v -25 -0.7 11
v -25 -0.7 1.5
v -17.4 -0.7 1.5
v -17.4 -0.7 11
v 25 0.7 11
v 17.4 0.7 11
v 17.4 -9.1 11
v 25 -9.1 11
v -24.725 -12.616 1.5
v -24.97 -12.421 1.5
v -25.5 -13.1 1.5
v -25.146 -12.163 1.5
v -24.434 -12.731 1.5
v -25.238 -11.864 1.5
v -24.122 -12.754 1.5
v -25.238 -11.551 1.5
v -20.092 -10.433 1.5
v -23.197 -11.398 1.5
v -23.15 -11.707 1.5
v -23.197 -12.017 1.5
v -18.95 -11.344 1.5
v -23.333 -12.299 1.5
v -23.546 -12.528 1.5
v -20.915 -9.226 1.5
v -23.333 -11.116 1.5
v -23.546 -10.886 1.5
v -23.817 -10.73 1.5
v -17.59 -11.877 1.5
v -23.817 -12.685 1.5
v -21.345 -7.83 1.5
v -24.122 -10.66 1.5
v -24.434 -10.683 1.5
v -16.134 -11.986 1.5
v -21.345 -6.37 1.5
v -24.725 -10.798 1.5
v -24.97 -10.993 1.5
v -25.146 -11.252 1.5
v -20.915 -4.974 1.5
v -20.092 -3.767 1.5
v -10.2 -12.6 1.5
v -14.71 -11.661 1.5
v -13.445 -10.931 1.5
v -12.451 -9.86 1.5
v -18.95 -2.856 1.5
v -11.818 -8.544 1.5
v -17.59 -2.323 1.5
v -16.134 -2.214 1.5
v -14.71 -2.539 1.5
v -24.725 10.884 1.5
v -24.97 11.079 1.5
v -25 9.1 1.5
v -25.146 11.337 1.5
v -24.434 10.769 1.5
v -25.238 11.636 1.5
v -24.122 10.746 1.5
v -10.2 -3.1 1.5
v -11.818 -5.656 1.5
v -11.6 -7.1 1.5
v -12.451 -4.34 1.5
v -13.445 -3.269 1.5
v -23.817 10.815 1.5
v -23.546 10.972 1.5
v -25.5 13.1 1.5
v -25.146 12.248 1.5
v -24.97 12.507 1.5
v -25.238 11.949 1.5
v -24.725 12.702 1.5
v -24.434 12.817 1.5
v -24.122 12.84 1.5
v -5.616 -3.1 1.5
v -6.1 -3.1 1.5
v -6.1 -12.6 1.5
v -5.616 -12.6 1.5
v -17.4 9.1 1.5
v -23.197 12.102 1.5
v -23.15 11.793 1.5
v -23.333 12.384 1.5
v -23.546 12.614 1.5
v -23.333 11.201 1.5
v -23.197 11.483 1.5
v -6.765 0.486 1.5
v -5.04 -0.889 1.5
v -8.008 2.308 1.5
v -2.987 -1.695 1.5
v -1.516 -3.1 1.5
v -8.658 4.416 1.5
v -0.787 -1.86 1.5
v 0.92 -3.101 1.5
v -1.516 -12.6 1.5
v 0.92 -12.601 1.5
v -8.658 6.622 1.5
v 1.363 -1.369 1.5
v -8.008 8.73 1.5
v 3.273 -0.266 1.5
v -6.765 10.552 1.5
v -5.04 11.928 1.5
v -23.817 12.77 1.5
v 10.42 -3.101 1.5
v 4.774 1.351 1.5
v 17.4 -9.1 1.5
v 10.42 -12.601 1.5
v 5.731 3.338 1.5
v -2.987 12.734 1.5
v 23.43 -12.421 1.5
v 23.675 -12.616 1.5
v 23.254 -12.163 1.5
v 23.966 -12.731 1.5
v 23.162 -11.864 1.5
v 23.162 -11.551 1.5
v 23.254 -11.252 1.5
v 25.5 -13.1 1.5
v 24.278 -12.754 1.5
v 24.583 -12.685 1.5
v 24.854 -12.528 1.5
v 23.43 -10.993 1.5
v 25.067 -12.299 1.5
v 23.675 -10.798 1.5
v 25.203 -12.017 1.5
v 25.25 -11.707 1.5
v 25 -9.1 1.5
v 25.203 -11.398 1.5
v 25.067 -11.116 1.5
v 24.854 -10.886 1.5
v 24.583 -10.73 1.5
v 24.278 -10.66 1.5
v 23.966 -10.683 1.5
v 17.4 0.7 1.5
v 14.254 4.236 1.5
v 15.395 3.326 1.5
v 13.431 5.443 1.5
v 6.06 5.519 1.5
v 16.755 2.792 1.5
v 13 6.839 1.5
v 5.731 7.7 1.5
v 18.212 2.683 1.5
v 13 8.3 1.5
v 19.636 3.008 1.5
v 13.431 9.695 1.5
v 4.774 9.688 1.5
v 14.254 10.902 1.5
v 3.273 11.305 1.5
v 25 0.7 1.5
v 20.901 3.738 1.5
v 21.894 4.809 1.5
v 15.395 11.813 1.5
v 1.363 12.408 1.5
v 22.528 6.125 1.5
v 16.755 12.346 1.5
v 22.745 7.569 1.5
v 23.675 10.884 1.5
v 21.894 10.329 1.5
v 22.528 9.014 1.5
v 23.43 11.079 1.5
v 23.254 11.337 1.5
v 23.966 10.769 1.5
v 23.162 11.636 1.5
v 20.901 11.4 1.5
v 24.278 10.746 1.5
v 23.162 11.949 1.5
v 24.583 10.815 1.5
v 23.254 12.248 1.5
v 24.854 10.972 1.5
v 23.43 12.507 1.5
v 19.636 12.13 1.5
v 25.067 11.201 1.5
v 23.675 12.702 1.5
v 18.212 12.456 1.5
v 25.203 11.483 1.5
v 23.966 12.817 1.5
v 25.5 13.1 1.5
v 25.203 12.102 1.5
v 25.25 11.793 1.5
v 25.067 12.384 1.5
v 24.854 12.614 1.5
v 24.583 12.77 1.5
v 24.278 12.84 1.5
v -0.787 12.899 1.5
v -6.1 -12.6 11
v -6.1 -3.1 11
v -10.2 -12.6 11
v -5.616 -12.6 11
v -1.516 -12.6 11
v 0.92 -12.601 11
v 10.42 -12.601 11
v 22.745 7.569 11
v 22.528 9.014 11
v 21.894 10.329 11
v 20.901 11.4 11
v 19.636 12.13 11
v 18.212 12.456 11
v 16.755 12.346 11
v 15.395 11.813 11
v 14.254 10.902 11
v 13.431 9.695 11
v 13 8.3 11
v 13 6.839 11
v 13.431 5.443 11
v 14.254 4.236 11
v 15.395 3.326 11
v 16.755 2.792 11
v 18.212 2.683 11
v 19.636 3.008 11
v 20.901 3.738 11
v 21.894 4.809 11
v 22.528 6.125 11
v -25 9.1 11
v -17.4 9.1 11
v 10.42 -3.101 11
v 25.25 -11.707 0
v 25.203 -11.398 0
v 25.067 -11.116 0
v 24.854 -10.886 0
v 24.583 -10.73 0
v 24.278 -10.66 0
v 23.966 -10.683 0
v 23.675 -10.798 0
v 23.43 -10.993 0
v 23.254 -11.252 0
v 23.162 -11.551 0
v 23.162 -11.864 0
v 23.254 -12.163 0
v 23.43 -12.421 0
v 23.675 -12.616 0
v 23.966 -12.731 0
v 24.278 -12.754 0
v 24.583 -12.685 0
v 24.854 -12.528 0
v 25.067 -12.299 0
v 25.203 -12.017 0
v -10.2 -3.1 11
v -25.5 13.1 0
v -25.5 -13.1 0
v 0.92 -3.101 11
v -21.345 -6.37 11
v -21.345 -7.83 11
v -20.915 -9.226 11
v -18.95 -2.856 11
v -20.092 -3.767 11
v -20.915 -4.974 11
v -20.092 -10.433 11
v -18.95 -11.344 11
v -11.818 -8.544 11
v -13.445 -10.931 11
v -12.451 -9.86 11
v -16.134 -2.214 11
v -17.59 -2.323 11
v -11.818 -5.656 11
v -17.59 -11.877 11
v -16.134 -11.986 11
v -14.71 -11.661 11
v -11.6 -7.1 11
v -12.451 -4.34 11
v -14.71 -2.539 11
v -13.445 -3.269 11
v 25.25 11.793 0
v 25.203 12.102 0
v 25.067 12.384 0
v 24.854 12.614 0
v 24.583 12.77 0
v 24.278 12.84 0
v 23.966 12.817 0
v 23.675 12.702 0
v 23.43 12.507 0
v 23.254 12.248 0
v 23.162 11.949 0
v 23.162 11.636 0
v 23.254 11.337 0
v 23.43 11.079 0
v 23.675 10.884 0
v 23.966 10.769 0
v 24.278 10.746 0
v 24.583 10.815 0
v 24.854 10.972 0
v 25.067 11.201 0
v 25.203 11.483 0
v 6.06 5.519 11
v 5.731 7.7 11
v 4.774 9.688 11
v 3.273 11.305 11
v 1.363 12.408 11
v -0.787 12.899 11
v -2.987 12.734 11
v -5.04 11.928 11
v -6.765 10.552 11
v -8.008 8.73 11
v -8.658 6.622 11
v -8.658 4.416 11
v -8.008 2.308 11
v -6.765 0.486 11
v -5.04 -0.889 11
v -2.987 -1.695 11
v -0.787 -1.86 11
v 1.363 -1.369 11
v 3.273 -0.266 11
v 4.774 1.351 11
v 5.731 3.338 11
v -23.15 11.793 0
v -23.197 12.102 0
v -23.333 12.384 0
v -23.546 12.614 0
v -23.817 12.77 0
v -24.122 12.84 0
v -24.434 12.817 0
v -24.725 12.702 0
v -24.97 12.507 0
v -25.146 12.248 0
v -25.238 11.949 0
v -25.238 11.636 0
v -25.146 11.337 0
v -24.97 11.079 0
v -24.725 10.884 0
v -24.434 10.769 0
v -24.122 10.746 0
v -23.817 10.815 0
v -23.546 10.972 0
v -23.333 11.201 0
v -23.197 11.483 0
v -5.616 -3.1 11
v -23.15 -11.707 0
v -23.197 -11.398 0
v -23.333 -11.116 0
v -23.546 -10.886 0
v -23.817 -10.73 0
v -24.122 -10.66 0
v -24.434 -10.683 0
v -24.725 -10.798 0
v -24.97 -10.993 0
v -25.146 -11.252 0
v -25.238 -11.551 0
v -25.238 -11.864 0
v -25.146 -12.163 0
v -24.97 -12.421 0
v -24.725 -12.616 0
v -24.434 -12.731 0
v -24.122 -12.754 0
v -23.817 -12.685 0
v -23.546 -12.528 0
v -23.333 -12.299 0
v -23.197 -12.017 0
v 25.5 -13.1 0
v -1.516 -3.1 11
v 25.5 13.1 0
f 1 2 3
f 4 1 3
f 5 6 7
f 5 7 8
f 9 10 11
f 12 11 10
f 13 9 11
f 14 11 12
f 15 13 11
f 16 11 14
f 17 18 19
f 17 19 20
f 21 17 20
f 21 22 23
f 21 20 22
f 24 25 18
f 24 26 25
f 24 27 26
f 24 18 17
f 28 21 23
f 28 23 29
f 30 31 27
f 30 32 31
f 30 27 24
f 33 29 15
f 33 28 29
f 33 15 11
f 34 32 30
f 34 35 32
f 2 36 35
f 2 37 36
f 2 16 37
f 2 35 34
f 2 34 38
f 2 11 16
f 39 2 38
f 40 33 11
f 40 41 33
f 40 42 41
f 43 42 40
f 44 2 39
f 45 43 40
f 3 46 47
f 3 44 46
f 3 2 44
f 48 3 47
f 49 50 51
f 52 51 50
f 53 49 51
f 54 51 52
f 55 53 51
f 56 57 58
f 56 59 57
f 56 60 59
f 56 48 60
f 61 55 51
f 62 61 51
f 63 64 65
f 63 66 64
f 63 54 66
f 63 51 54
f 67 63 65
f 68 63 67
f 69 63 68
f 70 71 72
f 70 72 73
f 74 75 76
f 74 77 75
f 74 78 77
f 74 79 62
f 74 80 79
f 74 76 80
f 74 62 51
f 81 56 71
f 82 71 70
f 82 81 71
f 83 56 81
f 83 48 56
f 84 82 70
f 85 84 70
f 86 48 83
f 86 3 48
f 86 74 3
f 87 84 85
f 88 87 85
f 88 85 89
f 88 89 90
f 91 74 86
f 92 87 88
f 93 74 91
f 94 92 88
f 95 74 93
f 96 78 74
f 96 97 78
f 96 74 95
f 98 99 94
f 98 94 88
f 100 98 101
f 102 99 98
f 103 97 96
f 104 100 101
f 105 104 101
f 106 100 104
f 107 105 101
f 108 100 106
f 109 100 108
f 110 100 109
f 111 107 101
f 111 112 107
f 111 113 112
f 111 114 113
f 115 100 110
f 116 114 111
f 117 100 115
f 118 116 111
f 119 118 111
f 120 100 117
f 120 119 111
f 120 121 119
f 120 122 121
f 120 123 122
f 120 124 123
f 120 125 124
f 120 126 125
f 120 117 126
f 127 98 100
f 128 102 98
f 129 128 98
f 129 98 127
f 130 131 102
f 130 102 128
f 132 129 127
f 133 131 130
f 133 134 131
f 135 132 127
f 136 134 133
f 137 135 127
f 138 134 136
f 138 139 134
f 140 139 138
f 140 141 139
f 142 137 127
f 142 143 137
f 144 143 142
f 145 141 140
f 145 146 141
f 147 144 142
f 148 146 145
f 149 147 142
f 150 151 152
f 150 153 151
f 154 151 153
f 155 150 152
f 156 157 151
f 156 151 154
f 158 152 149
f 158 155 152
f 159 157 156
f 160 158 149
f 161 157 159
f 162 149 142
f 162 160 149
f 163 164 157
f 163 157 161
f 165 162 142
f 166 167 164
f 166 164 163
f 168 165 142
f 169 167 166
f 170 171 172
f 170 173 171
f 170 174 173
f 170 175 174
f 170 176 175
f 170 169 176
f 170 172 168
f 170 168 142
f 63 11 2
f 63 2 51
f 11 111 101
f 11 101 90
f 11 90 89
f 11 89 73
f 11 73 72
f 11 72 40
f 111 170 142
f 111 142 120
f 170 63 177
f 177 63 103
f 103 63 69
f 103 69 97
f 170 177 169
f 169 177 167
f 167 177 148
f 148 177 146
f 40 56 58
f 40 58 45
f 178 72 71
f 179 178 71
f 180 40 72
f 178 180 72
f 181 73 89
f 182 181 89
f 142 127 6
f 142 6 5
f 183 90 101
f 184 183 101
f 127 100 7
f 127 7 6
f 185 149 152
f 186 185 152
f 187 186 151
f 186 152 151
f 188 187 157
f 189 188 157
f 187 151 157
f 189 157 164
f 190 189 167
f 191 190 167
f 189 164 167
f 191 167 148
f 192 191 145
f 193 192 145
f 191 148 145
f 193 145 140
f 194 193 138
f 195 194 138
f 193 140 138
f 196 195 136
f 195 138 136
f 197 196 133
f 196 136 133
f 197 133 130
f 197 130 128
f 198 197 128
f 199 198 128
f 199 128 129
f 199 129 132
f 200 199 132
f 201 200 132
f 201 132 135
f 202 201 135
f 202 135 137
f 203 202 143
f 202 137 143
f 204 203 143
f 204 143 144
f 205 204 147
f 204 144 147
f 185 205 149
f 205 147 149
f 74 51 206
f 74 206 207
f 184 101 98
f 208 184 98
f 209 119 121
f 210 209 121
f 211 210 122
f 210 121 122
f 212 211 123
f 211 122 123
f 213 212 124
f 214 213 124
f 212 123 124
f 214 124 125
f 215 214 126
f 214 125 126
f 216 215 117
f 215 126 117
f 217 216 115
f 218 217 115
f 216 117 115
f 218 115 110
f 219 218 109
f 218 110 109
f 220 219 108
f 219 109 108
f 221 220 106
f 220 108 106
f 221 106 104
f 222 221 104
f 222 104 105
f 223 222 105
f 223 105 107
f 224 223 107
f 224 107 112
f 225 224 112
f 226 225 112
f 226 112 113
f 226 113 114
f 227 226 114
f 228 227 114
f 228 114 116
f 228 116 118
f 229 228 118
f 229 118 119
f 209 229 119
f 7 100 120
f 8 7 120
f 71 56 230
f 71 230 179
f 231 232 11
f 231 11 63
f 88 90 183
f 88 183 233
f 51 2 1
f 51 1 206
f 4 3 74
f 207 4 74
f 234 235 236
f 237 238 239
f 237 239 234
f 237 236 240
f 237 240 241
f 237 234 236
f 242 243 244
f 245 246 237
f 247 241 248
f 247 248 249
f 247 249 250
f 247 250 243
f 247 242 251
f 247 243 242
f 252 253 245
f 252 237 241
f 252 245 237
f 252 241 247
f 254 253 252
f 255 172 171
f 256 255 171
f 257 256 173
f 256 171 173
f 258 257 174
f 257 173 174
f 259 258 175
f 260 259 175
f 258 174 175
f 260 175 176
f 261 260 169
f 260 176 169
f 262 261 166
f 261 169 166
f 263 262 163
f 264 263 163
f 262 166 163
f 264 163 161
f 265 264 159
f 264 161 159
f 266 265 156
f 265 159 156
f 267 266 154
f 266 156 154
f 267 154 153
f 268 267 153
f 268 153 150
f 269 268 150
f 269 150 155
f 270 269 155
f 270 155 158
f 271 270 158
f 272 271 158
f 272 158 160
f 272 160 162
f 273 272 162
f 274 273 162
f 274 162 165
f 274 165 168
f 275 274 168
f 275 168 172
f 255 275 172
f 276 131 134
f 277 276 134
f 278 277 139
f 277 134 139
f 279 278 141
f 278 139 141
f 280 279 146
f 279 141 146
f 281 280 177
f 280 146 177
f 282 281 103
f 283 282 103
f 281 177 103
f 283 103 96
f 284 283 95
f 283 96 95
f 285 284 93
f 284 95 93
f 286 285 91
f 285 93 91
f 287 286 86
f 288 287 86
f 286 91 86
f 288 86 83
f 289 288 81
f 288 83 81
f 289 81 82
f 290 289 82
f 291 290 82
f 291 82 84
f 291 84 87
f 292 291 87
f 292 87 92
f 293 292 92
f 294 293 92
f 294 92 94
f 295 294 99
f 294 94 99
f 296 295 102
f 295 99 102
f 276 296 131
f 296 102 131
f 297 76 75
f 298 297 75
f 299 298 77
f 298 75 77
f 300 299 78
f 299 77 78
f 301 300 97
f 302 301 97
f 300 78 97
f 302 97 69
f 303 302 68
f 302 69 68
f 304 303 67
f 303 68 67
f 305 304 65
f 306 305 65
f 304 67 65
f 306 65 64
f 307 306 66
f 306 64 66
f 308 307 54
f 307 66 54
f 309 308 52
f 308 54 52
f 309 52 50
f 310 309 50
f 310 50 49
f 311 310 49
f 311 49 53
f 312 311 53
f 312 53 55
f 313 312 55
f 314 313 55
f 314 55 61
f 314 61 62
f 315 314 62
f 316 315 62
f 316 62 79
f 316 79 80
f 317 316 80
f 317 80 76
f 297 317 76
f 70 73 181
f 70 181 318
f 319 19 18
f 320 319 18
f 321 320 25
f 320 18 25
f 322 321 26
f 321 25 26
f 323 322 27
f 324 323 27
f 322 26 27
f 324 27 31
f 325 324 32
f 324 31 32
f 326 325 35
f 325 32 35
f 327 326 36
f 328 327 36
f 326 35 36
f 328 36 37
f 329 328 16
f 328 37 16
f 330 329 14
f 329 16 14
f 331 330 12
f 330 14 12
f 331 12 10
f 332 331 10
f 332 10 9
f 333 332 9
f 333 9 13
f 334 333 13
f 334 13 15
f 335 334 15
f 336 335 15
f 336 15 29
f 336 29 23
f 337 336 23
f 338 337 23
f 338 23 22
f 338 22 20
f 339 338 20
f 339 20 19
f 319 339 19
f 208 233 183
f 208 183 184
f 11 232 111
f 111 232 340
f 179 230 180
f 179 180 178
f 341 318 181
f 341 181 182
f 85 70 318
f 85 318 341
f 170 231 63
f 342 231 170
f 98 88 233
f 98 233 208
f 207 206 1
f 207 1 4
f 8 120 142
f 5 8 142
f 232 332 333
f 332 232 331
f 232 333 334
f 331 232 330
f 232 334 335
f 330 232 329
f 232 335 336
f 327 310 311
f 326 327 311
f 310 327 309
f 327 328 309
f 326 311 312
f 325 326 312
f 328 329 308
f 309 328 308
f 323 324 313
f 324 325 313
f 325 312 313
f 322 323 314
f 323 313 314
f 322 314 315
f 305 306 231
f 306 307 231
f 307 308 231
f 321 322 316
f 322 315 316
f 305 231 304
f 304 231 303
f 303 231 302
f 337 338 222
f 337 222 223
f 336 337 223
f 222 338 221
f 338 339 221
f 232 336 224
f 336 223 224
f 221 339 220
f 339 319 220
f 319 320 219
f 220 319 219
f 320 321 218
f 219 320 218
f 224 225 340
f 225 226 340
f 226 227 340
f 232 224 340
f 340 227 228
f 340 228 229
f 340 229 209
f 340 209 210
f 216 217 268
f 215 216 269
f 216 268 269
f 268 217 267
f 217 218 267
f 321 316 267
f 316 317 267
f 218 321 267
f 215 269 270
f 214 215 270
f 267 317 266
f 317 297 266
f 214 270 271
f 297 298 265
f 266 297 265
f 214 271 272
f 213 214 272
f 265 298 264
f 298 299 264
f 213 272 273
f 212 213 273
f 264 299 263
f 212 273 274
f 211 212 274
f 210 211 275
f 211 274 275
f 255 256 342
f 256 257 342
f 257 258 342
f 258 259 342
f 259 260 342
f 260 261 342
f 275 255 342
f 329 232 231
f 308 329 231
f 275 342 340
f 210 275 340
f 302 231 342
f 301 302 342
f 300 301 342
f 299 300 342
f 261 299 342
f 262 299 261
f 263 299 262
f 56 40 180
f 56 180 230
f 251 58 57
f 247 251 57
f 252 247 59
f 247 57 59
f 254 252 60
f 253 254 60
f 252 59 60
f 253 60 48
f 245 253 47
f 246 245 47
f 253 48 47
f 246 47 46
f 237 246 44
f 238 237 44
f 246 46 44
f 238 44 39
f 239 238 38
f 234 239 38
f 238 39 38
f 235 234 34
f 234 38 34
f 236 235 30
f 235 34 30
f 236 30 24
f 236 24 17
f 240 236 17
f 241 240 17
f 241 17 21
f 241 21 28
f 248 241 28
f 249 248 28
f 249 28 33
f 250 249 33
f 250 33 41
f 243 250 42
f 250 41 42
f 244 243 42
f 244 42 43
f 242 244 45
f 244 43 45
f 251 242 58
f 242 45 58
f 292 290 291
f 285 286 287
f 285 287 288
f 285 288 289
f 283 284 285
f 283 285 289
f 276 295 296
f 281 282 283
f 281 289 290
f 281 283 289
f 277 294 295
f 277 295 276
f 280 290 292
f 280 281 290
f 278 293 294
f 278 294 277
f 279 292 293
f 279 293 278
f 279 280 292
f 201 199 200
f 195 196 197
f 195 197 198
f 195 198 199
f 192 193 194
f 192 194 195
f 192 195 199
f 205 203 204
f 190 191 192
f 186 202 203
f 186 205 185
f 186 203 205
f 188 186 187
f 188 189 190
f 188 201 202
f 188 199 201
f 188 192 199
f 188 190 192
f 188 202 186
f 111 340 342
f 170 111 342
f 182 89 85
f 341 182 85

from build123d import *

# Parameters (mm, degrees)
SKETCH_1_W          = 51
SKETCH_1_H          = 26.2
EXTRUDE_1_DEPTH     = 1.5
SKETCH_2_R          = 4.9
SKETCH_2_R_2        = 7.4
SKETCH_2_W          = 7.6
SKETCH_2_H          = 9.8
SKETCH_2_W_2        = 4.1
SKETCH_2_H_2        = 9.5
SKETCH_2_W_3        = 9.5
EXTRUDE_2_DEPTH     = 9.5
SKETCH_3_R          = 1.05
CUT_EXTRUDE_2_DEPTH = 31.201158918


with BuildPart() as part:
    # Эскиз1 → Бобышка-Вытянуть1 (new body)
    with BuildSketch(Plane.XY):
        Rectangle(SKETCH_1_W, SKETCH_1_H)
    extrude(amount=EXTRUDE_1_DEPTH)

    # Эскиз2 → Бобышка-Вытянуть2 (add)
    with BuildSketch(Plane.XY.offset(1.5)):
        with Locations((17.845463421, 7.569209816)):
            Circle(SKETCH_2_R)
        with Locations((-1.340380905, 5.519215491)):
            Circle(SKETCH_2_R_2)
        with Locations((-16.5, -7.1)):
            Circle(SKETCH_2_R)
        with Locations((-21.2, 4.2)):
            Rectangle(SKETCH_2_W, SKETCH_2_H)
        with Locations((21.2, -4.2)):
            Rectangle(SKETCH_2_W, SKETCH_2_H)
        with Locations((-8.15, -7.85)):
            Rectangle(SKETCH_2_W_2, SKETCH_2_H_2)
        with Locations((-3.565582746, -7.85)):
            Rectangle(SKETCH_2_W_2, SKETCH_2_H_2)
        with Locations((5.669869249, -7.851273466)):
            Rectangle(SKETCH_2_W_3, SKETCH_2_H_2)
    extrude(amount=EXTRUDE_2_DEPTH)

    # Эскиз3 → Вырез-Вытянуть2 (cut, through all)
    with BuildSketch(Plane.XY.offset(1.5)):
        with Locations((-24.200212884, 11.79290343)):
            Circle(SKETCH_3_R)
        with Locations((24.199787116, 11.79290343)):
            Circle(SKETCH_3_R)
        with Locations((24.199787116, -11.70709657)):
            Circle(SKETCH_3_R)
        with Locations((-24.200212884, -11.70709657)):
            Circle(SKETCH_3_R)
    extrude(amount=-CUT_EXTRUDE_2_DEPTH, mode=Mode.SUBTRACT)


solid = part.part
